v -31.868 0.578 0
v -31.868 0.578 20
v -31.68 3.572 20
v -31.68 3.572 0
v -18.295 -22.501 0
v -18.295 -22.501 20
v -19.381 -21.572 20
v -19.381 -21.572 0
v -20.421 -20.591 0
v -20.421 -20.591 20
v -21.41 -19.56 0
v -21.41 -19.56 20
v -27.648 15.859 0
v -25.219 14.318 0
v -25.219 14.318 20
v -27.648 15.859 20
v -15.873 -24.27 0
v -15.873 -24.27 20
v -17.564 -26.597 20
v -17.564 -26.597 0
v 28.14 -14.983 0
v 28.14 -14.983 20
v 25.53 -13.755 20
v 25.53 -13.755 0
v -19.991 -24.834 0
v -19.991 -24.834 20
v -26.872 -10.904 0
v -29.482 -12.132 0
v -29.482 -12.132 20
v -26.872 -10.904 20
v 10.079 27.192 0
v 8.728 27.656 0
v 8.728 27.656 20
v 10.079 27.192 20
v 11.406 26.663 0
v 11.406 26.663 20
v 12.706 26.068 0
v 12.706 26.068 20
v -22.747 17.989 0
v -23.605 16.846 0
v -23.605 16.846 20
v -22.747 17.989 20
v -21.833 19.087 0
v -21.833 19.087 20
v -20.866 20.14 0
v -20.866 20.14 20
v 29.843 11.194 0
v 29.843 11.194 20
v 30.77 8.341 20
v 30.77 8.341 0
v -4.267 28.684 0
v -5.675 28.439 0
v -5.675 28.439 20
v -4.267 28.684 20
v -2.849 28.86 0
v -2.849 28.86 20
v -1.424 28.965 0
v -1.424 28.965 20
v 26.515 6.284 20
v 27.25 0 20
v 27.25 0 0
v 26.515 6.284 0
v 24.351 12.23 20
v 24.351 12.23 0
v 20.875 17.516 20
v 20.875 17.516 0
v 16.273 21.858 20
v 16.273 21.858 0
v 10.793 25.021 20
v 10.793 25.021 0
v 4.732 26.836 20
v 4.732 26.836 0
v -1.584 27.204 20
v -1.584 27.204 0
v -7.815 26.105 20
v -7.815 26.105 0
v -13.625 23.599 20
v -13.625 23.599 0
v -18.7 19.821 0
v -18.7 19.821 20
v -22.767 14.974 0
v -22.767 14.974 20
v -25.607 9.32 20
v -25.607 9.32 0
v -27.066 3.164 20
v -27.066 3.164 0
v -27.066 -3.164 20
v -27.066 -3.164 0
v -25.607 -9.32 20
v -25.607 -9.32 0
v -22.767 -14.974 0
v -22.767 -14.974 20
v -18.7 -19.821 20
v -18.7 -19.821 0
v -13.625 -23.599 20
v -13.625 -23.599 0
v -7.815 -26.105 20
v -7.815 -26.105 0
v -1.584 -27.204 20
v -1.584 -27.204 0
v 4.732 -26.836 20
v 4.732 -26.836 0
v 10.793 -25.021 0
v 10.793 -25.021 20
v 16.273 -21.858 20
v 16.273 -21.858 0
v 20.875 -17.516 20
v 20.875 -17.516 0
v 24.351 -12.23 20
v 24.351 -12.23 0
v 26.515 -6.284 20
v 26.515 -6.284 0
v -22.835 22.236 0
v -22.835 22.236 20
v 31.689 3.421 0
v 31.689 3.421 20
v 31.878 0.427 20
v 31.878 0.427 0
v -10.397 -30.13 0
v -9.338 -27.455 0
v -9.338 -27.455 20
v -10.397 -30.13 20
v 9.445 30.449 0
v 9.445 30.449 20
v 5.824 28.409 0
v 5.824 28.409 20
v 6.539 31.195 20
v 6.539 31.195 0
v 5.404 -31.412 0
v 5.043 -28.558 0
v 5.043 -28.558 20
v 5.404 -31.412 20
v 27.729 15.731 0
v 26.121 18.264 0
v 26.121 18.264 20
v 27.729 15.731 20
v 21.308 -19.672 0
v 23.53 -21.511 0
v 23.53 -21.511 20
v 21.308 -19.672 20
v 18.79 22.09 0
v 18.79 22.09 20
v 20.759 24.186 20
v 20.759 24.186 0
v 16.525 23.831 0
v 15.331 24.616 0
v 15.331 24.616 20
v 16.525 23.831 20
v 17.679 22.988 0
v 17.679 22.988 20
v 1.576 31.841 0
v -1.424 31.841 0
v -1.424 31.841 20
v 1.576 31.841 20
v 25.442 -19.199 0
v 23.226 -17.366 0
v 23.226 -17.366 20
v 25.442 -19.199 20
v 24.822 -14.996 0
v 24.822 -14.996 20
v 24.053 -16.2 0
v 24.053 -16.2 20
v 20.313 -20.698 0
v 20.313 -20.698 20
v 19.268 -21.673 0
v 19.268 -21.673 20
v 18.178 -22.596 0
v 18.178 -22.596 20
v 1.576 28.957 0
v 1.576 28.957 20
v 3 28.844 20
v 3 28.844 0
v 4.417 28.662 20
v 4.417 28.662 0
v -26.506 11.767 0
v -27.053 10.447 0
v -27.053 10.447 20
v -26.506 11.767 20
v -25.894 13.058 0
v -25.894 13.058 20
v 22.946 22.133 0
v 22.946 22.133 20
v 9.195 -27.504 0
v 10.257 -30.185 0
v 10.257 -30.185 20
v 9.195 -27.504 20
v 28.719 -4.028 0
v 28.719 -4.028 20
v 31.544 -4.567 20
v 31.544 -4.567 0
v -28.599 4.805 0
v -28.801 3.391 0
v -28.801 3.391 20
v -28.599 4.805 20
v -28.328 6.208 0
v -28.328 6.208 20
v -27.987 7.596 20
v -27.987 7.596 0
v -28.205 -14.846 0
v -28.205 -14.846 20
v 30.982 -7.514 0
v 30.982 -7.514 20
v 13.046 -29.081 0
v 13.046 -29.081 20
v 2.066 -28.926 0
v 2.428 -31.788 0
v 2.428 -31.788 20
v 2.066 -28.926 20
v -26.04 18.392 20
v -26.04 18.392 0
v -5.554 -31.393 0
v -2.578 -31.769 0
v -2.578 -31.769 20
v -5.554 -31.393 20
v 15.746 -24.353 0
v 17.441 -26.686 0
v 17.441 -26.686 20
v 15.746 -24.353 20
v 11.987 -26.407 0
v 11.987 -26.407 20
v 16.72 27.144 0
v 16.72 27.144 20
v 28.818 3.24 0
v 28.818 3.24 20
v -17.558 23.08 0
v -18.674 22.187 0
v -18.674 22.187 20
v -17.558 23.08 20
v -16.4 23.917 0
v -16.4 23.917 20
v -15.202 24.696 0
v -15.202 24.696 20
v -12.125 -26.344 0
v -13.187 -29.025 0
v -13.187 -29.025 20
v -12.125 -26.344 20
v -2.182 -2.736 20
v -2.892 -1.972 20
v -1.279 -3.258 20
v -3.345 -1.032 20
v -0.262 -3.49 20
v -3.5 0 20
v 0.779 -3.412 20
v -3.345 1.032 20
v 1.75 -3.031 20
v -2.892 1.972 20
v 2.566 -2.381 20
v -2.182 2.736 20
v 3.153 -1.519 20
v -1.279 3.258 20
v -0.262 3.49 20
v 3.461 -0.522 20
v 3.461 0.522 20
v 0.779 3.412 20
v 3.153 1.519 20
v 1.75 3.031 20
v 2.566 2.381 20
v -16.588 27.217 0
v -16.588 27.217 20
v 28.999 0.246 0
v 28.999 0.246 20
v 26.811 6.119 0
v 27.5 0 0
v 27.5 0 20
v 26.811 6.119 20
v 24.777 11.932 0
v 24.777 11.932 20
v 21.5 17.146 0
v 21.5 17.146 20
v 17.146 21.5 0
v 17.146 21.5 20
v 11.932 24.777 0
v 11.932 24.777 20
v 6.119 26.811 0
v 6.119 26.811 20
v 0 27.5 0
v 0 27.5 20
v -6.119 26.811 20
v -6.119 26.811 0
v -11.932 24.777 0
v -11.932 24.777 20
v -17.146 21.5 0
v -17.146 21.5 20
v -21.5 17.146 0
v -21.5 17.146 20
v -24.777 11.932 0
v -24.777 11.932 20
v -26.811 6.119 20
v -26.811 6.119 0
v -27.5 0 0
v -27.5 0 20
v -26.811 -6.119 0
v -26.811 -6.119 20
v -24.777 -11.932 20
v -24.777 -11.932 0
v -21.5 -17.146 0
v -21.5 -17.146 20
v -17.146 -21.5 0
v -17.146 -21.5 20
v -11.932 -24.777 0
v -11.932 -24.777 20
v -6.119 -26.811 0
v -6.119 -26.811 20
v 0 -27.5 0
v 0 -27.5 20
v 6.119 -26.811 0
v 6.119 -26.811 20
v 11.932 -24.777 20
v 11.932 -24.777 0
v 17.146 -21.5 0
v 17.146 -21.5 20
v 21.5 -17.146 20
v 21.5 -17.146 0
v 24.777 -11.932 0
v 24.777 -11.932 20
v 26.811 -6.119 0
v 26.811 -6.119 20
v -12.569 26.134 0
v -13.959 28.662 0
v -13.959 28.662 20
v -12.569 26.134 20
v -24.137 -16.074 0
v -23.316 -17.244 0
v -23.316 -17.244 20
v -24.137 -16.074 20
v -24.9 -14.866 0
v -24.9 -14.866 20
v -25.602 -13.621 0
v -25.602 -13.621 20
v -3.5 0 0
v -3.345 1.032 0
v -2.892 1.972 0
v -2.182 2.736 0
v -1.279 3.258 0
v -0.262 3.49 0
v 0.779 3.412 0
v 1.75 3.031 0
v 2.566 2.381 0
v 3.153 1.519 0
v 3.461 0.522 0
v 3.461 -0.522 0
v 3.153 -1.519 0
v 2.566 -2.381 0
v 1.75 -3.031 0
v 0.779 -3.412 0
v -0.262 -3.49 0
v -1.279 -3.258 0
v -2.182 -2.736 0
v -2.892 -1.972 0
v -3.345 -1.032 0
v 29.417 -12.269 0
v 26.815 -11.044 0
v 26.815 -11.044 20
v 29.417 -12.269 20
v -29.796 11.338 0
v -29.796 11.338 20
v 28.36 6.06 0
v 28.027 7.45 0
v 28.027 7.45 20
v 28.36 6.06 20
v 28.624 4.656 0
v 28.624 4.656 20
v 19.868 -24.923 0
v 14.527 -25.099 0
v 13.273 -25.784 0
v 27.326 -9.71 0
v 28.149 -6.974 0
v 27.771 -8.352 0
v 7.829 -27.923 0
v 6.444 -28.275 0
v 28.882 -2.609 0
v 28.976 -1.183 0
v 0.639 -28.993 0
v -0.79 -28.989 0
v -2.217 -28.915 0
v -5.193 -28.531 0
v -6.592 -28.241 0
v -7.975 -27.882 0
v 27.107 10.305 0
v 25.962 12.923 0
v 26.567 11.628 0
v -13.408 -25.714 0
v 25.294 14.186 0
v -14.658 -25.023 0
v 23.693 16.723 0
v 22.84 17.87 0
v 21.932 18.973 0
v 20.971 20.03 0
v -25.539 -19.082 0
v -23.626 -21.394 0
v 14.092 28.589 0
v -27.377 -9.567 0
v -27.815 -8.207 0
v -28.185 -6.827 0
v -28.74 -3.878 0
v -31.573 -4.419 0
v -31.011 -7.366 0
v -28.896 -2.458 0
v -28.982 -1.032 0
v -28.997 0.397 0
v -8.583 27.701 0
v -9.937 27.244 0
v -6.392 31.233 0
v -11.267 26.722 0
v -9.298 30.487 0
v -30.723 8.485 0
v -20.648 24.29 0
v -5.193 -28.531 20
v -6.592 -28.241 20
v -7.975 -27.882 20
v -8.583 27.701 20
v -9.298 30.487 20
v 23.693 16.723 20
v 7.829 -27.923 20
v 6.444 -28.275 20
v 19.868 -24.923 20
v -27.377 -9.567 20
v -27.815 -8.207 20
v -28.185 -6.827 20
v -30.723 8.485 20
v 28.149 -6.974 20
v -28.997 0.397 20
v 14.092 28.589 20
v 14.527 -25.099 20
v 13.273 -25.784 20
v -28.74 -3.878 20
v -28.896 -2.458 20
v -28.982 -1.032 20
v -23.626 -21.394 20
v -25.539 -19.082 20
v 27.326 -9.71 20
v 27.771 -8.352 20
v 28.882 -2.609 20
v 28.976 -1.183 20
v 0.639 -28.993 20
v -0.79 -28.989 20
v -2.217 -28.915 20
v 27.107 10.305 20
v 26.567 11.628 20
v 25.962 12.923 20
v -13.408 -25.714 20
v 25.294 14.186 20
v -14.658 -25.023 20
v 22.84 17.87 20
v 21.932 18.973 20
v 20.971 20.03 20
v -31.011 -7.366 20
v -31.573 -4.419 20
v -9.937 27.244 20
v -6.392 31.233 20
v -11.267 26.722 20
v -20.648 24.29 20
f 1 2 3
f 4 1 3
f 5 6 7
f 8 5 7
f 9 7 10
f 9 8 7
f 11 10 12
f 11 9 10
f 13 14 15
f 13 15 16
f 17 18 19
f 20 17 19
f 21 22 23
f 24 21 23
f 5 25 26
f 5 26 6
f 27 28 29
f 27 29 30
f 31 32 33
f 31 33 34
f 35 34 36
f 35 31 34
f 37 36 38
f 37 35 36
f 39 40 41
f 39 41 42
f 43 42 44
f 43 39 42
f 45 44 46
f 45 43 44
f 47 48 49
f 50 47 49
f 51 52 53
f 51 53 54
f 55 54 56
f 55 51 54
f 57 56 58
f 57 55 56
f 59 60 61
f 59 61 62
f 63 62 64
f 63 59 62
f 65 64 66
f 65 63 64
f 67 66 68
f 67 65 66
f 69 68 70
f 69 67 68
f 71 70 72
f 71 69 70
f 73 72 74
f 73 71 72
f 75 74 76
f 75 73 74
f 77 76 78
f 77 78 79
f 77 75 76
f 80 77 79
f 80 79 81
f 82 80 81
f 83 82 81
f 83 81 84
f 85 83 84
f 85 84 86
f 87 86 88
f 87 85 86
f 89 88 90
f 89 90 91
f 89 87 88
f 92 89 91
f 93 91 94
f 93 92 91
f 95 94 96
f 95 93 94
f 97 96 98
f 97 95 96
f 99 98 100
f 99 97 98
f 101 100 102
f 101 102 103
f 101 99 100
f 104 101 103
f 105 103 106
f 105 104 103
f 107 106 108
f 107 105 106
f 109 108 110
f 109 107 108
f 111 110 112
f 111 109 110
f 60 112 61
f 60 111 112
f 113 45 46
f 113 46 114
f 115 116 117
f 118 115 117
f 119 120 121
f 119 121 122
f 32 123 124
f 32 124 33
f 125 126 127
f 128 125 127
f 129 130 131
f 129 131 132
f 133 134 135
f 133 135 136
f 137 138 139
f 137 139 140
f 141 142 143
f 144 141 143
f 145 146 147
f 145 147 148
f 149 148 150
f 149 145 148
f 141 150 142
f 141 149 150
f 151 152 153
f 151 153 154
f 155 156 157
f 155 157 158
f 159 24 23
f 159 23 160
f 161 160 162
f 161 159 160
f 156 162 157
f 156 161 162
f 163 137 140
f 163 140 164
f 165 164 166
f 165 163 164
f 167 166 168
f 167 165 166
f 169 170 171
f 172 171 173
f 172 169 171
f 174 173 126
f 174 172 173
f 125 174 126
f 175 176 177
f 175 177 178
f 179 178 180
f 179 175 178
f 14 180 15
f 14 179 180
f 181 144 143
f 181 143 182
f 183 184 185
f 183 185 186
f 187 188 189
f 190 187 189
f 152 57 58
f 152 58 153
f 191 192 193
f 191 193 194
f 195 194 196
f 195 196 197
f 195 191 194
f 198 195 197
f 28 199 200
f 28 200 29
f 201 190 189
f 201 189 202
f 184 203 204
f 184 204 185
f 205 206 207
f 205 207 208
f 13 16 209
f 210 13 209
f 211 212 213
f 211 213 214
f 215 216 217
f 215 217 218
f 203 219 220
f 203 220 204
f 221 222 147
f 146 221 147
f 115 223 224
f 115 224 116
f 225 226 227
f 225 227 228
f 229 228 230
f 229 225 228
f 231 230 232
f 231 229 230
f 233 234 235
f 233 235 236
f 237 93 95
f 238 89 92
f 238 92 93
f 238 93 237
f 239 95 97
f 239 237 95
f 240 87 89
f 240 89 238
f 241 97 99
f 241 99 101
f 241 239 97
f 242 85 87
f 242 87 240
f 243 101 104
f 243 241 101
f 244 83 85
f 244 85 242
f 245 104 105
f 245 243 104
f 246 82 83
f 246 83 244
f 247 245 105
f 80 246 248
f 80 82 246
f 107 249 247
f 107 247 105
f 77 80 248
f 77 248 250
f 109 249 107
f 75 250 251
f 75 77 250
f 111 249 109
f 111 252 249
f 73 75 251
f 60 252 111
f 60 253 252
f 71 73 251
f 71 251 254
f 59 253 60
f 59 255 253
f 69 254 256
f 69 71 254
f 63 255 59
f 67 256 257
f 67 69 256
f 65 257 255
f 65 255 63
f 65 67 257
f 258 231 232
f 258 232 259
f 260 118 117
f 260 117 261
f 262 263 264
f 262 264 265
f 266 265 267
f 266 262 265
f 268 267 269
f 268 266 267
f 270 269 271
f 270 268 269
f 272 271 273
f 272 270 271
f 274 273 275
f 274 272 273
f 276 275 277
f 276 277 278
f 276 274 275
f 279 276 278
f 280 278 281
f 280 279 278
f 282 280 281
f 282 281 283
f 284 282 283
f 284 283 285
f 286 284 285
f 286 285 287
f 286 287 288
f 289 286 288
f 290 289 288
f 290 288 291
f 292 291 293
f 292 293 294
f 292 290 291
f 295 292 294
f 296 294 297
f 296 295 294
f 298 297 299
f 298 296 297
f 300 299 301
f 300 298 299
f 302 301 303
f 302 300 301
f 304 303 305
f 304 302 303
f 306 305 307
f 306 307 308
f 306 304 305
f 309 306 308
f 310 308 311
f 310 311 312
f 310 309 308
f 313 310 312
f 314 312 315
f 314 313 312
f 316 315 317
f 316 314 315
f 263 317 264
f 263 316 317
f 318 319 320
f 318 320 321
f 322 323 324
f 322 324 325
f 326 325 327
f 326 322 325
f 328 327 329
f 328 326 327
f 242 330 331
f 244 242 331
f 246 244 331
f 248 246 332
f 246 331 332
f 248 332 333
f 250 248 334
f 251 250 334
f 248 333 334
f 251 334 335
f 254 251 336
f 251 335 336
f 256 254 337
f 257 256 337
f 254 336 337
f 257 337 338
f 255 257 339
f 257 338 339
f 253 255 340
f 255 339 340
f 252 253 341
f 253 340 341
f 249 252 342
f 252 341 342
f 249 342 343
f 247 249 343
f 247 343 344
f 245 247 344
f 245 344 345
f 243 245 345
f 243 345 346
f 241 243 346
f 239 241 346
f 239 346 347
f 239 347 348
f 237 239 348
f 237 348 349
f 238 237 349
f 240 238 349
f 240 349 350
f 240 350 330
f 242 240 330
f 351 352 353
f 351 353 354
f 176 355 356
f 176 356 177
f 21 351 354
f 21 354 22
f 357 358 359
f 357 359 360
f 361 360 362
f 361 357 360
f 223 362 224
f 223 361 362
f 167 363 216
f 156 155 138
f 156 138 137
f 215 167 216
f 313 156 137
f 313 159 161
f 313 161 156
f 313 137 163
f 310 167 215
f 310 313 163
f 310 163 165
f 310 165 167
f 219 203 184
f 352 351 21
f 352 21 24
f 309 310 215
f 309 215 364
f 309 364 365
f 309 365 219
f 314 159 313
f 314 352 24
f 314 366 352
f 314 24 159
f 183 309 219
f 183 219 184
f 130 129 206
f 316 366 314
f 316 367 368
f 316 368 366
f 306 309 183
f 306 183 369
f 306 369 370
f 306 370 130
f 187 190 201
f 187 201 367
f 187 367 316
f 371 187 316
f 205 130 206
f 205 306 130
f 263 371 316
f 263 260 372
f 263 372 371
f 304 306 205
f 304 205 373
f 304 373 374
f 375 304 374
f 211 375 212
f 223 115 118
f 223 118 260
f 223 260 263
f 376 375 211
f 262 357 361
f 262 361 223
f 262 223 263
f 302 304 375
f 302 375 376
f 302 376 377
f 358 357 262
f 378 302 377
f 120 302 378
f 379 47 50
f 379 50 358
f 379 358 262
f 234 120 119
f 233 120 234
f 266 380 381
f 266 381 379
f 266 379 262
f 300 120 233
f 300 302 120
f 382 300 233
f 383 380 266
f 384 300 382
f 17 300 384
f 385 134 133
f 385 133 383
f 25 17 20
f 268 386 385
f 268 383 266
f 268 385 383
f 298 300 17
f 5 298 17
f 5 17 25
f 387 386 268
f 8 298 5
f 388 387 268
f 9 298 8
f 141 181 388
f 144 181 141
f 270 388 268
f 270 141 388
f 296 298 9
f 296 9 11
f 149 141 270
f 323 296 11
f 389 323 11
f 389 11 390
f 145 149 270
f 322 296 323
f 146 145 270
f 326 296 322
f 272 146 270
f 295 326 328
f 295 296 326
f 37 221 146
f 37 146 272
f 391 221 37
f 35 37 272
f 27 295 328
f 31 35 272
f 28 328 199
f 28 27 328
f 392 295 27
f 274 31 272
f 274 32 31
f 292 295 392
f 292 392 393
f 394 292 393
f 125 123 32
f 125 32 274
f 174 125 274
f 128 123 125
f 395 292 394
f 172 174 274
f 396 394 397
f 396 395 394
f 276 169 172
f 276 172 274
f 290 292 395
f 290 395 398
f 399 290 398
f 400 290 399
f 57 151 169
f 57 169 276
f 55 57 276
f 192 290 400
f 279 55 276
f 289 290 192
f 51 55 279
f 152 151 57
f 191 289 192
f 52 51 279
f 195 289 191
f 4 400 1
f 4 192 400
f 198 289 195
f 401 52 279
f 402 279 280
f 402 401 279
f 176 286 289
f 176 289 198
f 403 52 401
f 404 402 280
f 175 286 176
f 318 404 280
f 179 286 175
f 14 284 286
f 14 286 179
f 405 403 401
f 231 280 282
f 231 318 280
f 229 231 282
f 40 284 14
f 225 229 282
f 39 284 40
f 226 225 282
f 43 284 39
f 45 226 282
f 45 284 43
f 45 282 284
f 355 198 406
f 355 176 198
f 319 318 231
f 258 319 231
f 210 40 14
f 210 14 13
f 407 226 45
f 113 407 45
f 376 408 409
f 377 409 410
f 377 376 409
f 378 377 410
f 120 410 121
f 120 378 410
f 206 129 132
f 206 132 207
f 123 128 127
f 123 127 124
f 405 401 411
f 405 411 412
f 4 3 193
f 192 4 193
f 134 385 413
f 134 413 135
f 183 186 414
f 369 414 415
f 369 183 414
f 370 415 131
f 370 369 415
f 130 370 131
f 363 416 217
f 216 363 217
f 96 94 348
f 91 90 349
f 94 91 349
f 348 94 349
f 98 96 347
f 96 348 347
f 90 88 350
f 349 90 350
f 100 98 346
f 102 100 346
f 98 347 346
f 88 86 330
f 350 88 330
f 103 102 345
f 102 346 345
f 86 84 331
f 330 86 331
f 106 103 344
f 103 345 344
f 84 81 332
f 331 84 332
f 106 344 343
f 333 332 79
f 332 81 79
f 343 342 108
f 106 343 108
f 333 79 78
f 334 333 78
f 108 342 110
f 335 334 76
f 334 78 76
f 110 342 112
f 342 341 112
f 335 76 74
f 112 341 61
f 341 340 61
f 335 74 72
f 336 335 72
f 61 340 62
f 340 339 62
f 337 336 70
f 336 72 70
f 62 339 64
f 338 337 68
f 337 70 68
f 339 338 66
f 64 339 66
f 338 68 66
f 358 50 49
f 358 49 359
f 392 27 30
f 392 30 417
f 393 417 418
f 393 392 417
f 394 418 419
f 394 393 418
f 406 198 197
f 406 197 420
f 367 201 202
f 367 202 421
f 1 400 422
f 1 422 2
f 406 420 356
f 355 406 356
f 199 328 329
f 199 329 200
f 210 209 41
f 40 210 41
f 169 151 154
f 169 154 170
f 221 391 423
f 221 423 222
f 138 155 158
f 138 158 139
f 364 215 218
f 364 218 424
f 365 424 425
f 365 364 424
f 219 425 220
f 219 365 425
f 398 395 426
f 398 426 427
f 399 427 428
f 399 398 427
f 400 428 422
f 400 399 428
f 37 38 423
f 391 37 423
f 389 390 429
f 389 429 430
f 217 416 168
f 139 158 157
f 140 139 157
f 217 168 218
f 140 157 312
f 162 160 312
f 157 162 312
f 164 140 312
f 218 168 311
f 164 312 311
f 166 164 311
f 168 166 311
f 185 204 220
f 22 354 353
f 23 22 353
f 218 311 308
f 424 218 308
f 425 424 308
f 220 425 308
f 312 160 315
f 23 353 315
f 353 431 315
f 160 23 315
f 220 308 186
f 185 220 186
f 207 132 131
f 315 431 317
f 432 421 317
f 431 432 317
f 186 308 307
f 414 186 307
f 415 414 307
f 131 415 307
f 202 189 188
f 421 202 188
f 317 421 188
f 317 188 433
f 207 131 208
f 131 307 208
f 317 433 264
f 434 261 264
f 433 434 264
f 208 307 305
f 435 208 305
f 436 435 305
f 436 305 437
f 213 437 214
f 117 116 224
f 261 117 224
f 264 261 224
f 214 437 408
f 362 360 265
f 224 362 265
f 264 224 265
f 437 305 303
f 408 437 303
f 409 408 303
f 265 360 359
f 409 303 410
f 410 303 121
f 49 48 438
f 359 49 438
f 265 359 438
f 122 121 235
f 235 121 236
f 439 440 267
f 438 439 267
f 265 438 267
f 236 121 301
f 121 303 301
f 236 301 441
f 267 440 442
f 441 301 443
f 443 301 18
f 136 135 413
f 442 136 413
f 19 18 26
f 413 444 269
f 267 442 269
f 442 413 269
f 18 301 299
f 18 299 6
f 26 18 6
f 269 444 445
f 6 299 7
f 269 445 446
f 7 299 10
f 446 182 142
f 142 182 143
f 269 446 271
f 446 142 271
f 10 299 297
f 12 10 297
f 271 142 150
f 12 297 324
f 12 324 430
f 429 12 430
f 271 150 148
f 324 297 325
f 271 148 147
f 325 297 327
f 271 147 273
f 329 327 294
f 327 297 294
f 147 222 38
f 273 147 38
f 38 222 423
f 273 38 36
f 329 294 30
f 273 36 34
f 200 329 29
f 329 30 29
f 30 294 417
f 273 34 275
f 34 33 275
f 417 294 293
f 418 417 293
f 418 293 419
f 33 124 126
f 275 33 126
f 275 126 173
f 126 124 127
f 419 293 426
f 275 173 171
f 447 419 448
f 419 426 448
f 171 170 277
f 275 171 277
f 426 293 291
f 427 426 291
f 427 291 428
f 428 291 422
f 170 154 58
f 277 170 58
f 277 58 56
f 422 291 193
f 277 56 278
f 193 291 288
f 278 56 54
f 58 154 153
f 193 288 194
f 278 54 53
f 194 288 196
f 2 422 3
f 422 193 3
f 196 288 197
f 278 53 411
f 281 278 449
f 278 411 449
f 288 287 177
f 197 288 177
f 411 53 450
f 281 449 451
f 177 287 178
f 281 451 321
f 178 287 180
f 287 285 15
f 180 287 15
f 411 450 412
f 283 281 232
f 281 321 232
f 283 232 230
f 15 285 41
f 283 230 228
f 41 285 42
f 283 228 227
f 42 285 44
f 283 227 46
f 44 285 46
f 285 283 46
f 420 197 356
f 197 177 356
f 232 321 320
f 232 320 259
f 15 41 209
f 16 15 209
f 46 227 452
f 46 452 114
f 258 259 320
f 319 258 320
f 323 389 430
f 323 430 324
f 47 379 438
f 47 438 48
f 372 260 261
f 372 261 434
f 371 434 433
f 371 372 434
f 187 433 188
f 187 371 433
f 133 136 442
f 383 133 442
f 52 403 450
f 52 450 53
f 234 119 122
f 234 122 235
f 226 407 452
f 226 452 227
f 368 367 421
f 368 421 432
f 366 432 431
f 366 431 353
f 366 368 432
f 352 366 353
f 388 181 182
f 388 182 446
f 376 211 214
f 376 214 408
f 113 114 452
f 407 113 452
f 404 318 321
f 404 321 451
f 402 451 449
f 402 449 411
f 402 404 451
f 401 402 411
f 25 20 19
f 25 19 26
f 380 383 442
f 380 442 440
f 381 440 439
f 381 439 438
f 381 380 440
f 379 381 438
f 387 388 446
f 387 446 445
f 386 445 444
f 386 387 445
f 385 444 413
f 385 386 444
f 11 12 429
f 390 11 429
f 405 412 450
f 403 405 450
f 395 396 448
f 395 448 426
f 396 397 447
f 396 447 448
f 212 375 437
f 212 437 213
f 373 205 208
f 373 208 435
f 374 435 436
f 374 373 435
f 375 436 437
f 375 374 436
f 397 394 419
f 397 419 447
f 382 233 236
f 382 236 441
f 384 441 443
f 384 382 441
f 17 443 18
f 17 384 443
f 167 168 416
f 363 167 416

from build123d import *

# Parameters (mm, degrees)
SKETCH1_R           = 27.5
BOSS_EXTRUDE2_DEPTH = 20
SKETCH2_R           = 27.249999983
BOSS_EXTRUDE5_DEPTH = 20
SKETCH3_R           = 3.5
CUT_EXTRUDE3_DEPTH  = 21


with BuildPart() as part:
    # Sketch1 → Boss-Extrude2 (new body)
    with BuildSketch(Plane.XY):
        with BuildLine():
            Line((-1.424336069, 28.965000721), (-1.424336069, 31.841424695))
            Line((-1.424336069, 31.841424695), (1.575663931, 31.841424695))
            Line((1.575663931, 31.841424695), (1.575663931, 28.957162899))
            ThreePointArc((1.575663931, 28.957162899), (3.709819287, 28.76173223), (5.823714829, 28.409229937))
            Line((5.823714829, 28.409229937), (6.539052383, 31.195285762))
            Line((6.539052383, 31.195285762), (9.444801866, 30.449216101))
            Line((9.444801866, 30.449216101), (8.727515125, 27.655568693))
            ThreePointArc((8.727515125, 27.655568693), (10.746020435, 26.935534983), (12.705840306, 26.068402754))
            Line((12.705840306, 26.068402754), (14.091568124, 28.589032297))
            Line((14.091568124, 28.589032297), (16.720488164, 27.143771275))
            Line((16.720488164, 27.143771275), (15.330984447, 24.616273396))
            ThreePointArc((15.330984447, 24.616273396), (17.107009598, 23.416879011), (18.789611108, 22.089601953))
            Line((18.789611108, 22.089601953), (20.758658815, 24.186424789))
            Line((20.758658815, 24.186424789), (22.945564697, 22.132783471))
            Line((22.945564697, 22.132783471), (20.971151632, 20.030247109))
            ThreePointArc((20.971151632, 20.030247109), (22.393102433, 18.42685441), (23.69276154, 16.722830221))
            Line((23.69276154, 16.722830221), (26.121406627, 18.26409526))
            Line((26.121406627, 18.26409526), (27.728887012, 15.731111484))
            Line((27.728887012, 15.731111484), (25.293624233, 14.18564673))
            ThreePointArc((25.293624233, 14.18564673), (26.272154286, 12.279002776), (27.107208629, 10.305301565))
            Line((27.107208629, 10.305301565), (29.842850394, 11.194165456))
            Line((29.842850394, 11.194165456), (30.769901377, 8.340995907))
            Line((30.769901377, 8.340995907), (28.026805401, 7.449709996))
            ThreePointArc((28.026805401, 7.449709996), (28.500430063, 5.35961624), (28.818410107, 3.24025291))
            Line((28.818410107, 3.24025291), (31.689158115, 3.420865066))
            Line((31.689158115, 3.420865066), (31.877529674, 0.426784881))
            Line((31.877529674, 0.426784881), (28.99895931, 0.245680584))
            ThreePointArc((28.99895931, 0.245680584), (28.937919002, -1.896534697), (28.718844891, -4.028392751))
            Line((28.718844891, -4.028392751), (31.544319488, -4.567380856))
            Line((31.544319488, -4.567380856), (30.982175544, -7.514242609))
            Line((30.982175544, -7.514242609), (28.149001955, -6.973785842))
            ThreePointArc((28.149001955, -6.973785842), (27.557132063, -9.033519383), (26.814769029, -11.04391968))
            Line((26.814769029, -11.04391968), (29.417435256, -12.268641442))
            Line((29.417435256, -12.268641442), (28.140097381, -14.9831226))
            Line((28.140097381, -14.9831226), (25.530339282, -13.755063655))
            ThreePointArc((25.530339282, -13.755063655), (24.44482917, -15.602894824), (23.225822612, -17.365516519))
            Line((23.225822612, -17.365516519), (25.442145376, -19.199018165))
            Line((25.442145376, -19.199018165), (23.529873407, -21.510557894))
            Line((23.529873407, -21.510557894), (21.307511498, -19.672060232))
            ThreePointArc((21.307511498, -19.672060232), (19.796567757, -21.191882999), (18.177512342, -22.59597409))
            Line((18.177512342, -22.59597409), (19.868231933, -24.923049968))
            Line((19.868231933, -24.923049968), (17.44118095, -26.686405725))
            Line((17.44118095, -26.686405725), (15.745854403, -24.352988916))
            ThreePointArc((15.745854403, -24.352988916), (13.904415186, -25.449307227), (11.987042119, -26.406643506))
            Line((11.987042119, -26.406643506), (13.045924408, -29.081074881))
            Line((13.045924408, -29.081074881), (10.25659495, -30.185448539))
            Line((10.25659495, -30.185448539), (9.194827367, -27.503729742))
            ThreePointArc((9.194827367, -27.503729742), (7.138597072, -28.107657886), (5.043381954, -28.558086394))
            Line((5.043381954, -28.558086394), (5.403893472, -31.411828906))
            Line((5.403893472, -31.411828906), (2.427549368, -31.787828607))
            Line((2.427549368, -31.787828607), (2.066055511, -28.926310076))
            ThreePointArc((2.066055511, -28.926310076), (-0.07576535, -28.999901028), (-2.217172447, -28.915119684))
            Line((-2.217172447, -28.915119684), (-2.577683965, -31.768862196))
            Line((-2.577683965, -31.768862196), (-5.554028069, -31.392862496))
            Line((-5.554028069, -31.392862496), (-5.192534211, -28.531343965))
            ThreePointArc((-5.192534211, -28.531343965), (-7.285367157, -28.069973733), (-9.338413749, -27.455309662))
            Line((-9.338413749, -27.455309662), (-10.397296038, -30.129741037))
            Line((-10.397296038, -30.129741037), (-13.186625496, -29.025367379))
            Line((-13.186625496, -29.025367379), (-12.124857912, -26.343648582))
            ThreePointArc((-12.124857912, -26.343648582), (-14.037202551, -25.376306755), (-15.872888171, -24.270381561))
            Line((-15.872888171, -24.270381561), (-17.563607762, -26.597457439))
            Line((-17.563607762, -26.597457439), (-19.990658746, -24.834101682))
            Line((-19.990658746, -24.834101682), (-18.295332198, -22.500684873))
            ThreePointArc((-18.295332198, -22.500684873), (-19.907028884, -21.088153096), (-21.410010653, -19.560456126))
            Line((-21.410010653, -19.560456126), (-23.626333417, -21.393957772))
            Line((-23.626333417, -21.393957772), (-25.538605386, -19.082418044))
            Line((-25.538605386, -19.082418044), (-23.316243477, -17.243920382))
            ThreePointArc((-23.316243477, -17.243920382), (-24.526023379, -15.474953221), (-25.601863425, -13.621475294))
            Line((-25.601863425, -13.621475294), (-28.204529651, -14.846197056))
            Line((-28.204529651, -14.846197056), (-29.481867526, -12.131715899))
            Line((-29.481867526, -12.131715899), (-26.872109426, -10.903656955))
            ThreePointArc((-26.872109426, -10.903656955), (-27.603957625, -8.889405122), (-28.185056961, -6.826607073))
            Line((-28.185056961, -6.826607073), (-31.010531558, -7.365595179))
            Line((-31.010531558, -7.365595179), (-31.572675502, -4.418733427))
            Line((-31.572675502, -4.418733427), (-28.739501912, -3.87827666))
            ThreePointArc((-28.739501912, -3.87827666), (-28.947433693, -1.745303007), (-28.99727971, 0.397201976))
            Line((-28.99727971, 0.397201976), (-31.868027719, 0.577814132))
            Line((-31.868027719, 0.577814132), (-31.67965616, 3.571894317))
            Line((-31.67965616, 3.571894317), (-28.801085796, 3.390790021))
            ThreePointArc((-28.801085796, 3.390790021), (-28.472036041, 5.508462915), (-27.987496731, 7.596053365))
            Line((-27.987496731, 7.596053365), (-30.723138496, 8.484917256))
            Line((-30.723138496, 8.484917256), (-29.796087512, 11.338086805))
            Line((-29.796087512, 11.338086805), (-27.052991537, 10.446800894))
            ThreePointArc((-27.052991537, 10.446800894), (-26.207635651, 12.416111854), (-25.219156402, 14.317616785))
            Line((-25.219156402, 14.317616785), (-27.647801489, 15.858881824))
            Line((-27.647801489, 15.858881824), (-26.040321104, 18.3918656))
            Line((-26.040321104, 18.3918656), (-23.605058325, 16.846400846))
            ThreePointArc((-23.605058325, 16.846400846), (-22.296513129, 18.543610821), (-20.866203726, 20.139551685))
            Line((-20.866203726, 20.139551685), (-22.835251433, 22.236374521))
            Line((-22.835251433, 22.236374521), (-20.648345551, 24.290015839))
            Line((-20.648345551, 24.290015839), (-18.673932486, 22.187479477))
            ThreePointArc((-18.673932486, 22.187479477), (-16.984418686, 23.505946522), (-15.20215073, 24.696044485))
            Line((-15.20215073, 24.696044485), (-16.587878547, 27.216674028))
            Line((-16.587878547, 27.216674028), (-13.958958507, 28.661935051))
            Line((-13.958958507, 28.661935051), (-12.56945479, 26.134437172))
            ThreePointArc((-12.56945479, 26.134437172), (-10.605130752, 26.991317154), (-8.582890693, 27.700793984))
            Line((-8.582890693, 27.700793984), (-9.298228247, 30.48684981))
            Line((-9.298228247, 30.48684981), (-6.392478763, 31.232919471))
            Line((-6.392478763, 31.232919471), (-5.675192023, 28.439272064))
            ThreePointArc((-5.675192023, 28.439272064), (-3.559483451, 28.780724063), (-1.424336069, 28.965000721))
        make_face()
        Circle(SKETCH1_R, mode=Mode.SUBTRACT)
    extrude(amount=BOSS_EXTRUDE2_DEPTH)


with BuildPart() as body_2:
    # Sketch2 → Boss-Extrude5 (new body)
    with BuildSketch(Plane.XY.offset(20)):
        Circle(SKETCH2_R)
    extrude(amount=-BOSS_EXTRUDE5_DEPTH)

    # Sketch3 → Cut-Extrude3 (cut, through all)
    with BuildSketch(Plane(origin=(0, 0, 0), x_dir=(-1, 0, 0), z_dir=(0, 0, -1))):
        Circle(SKETCH3_R)
    extrude(amount=-CUT_EXTRUDE3_DEPTH, mode=Mode.SUBTRACT)


solid = Compound([part.part, body_2.part])
